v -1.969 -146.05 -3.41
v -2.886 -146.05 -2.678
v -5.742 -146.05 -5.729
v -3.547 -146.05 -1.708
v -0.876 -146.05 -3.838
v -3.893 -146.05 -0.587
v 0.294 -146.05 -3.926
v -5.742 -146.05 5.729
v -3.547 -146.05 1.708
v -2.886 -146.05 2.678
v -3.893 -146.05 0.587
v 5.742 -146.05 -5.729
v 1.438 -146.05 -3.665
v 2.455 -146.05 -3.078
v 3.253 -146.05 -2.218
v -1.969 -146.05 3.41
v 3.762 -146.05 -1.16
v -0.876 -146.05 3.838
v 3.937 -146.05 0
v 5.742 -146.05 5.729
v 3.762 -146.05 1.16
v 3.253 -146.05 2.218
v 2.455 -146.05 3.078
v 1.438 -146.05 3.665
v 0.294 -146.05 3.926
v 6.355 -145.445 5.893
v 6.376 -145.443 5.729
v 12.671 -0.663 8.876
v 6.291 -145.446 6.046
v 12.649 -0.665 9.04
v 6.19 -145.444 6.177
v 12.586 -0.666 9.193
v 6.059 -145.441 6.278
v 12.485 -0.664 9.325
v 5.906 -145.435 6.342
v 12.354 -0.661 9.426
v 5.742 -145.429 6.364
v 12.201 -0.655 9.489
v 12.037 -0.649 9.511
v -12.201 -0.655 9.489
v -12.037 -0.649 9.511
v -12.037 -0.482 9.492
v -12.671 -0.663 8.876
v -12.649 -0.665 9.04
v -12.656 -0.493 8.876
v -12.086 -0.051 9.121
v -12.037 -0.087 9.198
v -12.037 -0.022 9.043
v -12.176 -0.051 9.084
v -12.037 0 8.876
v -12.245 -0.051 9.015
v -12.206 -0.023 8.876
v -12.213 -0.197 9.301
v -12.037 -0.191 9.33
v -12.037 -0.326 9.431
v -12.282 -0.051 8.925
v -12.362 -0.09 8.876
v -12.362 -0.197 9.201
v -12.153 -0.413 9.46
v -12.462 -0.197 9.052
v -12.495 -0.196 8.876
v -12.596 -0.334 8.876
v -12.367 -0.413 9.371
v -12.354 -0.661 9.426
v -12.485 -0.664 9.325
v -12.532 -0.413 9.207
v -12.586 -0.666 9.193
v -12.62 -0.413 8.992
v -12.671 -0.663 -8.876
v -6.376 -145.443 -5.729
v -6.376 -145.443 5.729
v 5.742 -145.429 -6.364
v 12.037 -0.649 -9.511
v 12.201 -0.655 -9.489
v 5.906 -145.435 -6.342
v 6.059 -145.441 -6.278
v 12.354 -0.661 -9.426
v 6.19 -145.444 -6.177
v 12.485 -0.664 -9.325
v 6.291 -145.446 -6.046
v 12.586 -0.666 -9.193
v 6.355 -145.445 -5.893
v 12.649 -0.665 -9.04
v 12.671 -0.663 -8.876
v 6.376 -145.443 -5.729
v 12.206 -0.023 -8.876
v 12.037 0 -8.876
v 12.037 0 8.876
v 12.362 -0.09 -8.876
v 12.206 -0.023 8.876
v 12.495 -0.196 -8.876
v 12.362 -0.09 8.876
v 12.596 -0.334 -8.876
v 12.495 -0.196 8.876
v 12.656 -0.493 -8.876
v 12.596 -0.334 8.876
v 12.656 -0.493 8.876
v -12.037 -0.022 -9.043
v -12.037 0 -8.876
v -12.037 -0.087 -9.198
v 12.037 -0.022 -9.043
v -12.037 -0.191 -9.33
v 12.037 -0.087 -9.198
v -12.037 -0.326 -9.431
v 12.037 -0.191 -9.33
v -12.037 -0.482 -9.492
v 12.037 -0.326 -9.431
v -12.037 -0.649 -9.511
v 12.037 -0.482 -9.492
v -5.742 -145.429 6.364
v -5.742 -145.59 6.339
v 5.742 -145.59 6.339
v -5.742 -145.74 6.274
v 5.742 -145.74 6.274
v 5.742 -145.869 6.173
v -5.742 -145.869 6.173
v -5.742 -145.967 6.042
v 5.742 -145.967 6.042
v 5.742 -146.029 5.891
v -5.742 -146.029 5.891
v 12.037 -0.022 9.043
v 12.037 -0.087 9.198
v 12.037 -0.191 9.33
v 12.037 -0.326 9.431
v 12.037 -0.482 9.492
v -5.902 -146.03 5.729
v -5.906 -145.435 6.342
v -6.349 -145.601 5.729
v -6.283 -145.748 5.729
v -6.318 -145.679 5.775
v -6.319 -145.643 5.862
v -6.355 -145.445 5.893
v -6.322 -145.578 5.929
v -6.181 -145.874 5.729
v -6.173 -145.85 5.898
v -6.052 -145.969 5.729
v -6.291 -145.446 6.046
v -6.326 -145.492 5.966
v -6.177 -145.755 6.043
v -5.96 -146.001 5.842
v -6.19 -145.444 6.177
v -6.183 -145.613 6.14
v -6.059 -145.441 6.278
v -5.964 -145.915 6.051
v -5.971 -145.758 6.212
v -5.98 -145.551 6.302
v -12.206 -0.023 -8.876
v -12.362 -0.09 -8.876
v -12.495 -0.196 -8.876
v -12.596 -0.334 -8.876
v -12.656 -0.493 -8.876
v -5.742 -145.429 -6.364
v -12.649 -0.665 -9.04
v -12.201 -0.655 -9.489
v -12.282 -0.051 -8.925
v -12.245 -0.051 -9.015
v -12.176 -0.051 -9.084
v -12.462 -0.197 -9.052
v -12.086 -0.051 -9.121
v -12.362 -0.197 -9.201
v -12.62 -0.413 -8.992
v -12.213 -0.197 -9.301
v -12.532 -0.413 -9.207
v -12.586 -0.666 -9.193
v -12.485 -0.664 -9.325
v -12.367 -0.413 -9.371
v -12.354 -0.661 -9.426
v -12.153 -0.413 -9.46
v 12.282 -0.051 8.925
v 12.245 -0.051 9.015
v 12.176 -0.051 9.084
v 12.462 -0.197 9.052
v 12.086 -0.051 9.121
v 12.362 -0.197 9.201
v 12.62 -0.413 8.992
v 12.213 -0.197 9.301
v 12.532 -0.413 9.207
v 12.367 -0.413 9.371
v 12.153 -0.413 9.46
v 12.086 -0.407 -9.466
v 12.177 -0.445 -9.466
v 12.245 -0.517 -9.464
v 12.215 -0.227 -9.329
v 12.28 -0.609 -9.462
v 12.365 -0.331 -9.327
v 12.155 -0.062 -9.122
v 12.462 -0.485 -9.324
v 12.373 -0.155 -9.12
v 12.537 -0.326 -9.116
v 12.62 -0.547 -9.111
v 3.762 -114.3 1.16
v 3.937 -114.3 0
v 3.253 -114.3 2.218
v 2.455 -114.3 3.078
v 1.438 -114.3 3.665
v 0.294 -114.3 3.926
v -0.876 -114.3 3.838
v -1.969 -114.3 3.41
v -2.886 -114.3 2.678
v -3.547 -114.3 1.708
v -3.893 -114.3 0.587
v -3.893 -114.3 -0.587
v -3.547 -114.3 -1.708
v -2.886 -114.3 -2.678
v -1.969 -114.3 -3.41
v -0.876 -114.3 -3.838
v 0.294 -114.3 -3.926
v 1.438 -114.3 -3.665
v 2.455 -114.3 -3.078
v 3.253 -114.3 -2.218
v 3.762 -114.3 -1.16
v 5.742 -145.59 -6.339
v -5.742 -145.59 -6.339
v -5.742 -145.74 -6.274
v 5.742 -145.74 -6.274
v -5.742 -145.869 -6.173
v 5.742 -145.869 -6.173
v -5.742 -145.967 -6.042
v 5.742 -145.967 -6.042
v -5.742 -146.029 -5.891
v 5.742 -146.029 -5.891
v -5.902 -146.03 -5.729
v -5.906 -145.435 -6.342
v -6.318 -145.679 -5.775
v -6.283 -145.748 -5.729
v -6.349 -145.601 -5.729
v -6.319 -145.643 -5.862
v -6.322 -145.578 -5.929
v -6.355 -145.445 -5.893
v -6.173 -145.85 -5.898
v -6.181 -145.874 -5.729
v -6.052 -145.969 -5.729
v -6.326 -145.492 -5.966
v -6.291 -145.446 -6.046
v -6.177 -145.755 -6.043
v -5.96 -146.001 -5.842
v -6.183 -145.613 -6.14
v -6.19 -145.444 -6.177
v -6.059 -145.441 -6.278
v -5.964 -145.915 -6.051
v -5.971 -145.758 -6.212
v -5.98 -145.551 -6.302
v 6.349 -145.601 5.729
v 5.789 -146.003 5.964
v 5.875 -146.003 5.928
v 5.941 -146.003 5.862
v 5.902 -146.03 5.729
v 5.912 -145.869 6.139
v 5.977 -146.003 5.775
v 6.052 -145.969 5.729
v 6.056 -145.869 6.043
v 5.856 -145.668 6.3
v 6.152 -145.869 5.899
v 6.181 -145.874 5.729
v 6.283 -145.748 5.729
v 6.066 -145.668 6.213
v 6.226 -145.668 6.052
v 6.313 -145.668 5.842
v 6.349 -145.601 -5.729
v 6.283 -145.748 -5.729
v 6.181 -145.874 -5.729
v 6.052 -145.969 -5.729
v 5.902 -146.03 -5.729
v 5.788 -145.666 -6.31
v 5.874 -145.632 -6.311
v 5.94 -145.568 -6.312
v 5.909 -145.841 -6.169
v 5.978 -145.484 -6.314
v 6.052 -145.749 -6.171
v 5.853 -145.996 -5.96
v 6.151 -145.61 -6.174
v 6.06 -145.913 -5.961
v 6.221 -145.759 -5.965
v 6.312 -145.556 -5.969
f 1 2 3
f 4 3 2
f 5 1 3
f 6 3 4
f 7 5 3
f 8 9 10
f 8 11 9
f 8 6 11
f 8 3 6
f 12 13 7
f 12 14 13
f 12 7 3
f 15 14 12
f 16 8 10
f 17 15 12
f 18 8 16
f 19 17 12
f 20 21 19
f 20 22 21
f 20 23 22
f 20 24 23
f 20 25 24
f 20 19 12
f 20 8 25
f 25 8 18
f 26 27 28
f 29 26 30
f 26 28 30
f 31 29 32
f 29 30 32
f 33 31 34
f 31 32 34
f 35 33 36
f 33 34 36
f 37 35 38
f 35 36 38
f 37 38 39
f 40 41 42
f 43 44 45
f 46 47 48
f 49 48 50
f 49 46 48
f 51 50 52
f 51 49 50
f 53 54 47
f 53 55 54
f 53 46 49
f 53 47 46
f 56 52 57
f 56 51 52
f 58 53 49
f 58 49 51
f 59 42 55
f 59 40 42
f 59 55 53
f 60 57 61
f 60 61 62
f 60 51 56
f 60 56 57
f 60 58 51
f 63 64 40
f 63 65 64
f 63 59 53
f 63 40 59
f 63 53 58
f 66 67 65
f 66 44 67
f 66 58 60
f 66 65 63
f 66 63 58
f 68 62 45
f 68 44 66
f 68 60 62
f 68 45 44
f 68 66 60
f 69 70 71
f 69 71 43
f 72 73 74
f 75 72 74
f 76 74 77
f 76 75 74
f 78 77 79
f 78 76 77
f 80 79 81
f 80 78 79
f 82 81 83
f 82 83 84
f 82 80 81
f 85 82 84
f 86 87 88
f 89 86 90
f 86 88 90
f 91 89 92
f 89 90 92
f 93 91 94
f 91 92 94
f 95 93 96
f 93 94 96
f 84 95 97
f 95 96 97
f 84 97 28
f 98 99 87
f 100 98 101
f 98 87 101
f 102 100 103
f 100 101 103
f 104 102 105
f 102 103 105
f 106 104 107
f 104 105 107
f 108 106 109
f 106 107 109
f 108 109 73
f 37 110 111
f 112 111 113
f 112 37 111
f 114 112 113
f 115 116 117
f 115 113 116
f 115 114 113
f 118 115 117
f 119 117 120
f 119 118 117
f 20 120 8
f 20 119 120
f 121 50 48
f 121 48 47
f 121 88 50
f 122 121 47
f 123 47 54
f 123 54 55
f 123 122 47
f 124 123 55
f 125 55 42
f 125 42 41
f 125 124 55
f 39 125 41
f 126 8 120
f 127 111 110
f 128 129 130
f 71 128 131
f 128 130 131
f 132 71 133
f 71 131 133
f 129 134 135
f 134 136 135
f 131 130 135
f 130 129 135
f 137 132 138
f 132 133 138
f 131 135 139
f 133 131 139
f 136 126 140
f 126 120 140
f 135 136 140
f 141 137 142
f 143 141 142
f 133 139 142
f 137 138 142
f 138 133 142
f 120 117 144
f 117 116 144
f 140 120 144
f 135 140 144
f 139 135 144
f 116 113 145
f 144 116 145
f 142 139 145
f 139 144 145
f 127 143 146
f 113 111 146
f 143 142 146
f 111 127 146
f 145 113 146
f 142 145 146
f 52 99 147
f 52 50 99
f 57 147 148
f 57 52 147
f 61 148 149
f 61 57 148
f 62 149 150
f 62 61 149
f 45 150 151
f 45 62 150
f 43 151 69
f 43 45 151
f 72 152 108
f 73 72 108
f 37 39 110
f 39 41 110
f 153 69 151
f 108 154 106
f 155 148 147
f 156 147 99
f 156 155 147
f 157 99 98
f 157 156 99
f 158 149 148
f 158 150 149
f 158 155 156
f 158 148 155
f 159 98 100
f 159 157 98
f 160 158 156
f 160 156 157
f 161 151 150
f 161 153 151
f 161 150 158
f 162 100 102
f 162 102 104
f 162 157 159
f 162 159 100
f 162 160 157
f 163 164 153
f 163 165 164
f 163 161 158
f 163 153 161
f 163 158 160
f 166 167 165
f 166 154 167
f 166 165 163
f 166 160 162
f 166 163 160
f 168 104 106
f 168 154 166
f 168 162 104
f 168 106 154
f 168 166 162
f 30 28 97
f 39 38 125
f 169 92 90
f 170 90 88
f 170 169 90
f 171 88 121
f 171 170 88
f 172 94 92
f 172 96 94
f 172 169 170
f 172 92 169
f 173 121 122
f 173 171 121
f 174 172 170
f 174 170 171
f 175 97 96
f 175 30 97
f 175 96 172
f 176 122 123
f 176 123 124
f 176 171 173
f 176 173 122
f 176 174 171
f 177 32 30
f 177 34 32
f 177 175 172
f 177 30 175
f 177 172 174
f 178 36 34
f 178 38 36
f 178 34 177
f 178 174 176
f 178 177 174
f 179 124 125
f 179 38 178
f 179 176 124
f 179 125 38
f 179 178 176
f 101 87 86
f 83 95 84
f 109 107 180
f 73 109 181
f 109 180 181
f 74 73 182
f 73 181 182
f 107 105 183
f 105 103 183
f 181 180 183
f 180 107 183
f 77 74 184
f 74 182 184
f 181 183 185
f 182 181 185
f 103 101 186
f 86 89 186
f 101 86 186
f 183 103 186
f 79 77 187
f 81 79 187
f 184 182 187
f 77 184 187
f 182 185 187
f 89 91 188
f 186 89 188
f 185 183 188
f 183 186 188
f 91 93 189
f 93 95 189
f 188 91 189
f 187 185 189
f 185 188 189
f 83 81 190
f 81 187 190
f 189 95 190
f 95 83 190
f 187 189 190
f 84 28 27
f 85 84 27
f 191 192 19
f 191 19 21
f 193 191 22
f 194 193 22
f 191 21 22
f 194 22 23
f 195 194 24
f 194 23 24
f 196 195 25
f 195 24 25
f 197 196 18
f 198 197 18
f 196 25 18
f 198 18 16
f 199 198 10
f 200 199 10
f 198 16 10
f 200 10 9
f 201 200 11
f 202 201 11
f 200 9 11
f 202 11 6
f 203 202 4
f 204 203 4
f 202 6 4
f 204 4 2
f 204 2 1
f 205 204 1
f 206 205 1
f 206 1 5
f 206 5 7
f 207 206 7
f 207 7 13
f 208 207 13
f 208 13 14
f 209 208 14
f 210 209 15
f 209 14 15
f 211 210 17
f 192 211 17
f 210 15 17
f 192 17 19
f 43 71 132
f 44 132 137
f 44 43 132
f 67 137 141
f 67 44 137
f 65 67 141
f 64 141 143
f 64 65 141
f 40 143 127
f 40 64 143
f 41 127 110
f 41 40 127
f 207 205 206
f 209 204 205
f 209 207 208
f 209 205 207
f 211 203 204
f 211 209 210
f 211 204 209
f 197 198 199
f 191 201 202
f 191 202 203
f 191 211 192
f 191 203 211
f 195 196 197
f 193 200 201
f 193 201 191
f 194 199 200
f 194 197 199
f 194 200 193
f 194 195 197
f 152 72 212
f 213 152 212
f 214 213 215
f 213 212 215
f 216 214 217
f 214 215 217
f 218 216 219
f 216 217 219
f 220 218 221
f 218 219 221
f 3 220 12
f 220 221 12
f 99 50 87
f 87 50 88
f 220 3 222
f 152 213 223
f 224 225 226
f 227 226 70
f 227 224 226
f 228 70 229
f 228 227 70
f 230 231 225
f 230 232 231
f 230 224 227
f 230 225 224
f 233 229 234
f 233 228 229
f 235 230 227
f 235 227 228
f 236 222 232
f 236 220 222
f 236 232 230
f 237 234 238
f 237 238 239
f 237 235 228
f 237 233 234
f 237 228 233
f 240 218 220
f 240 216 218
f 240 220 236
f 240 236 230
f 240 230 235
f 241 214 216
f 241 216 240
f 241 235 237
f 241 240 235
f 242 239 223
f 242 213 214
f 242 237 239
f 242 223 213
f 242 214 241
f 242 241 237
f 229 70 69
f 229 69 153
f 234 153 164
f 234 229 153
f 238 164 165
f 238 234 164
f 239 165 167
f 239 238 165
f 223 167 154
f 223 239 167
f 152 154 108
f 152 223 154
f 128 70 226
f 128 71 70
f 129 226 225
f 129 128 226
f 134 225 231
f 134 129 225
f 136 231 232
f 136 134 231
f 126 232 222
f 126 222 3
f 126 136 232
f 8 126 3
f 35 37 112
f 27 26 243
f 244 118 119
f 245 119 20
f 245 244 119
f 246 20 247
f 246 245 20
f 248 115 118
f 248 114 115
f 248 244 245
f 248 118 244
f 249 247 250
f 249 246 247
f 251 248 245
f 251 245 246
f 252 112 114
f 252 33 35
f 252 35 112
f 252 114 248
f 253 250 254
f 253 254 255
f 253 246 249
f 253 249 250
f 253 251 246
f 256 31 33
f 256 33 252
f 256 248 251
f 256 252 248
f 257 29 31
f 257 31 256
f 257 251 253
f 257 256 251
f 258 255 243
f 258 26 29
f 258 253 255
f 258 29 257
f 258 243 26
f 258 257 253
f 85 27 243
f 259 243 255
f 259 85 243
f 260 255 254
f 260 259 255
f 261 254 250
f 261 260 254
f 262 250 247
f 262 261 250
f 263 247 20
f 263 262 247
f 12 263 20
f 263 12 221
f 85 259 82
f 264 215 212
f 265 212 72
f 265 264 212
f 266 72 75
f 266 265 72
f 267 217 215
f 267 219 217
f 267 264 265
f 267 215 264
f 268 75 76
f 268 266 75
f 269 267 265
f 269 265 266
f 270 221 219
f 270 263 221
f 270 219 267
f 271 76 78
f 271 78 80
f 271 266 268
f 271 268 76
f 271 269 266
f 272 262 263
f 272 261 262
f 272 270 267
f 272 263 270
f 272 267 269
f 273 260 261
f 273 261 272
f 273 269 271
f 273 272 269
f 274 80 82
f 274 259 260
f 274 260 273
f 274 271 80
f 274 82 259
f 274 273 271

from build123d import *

# Parameters (mm, degrees)
F0_W      = 25.4
F0_H      = 19.05
F1_DEPTH  = 146.05
F4_DEPTH  = 25.4
F6_DEPTH  = 25.4
F8_DEPTH  = 12.7
F9_R      = 0.635
F10_R     = 3.937
F11_DEPTH = 31.75


with BuildPart() as f1:
    # F0 (on Front) → F1 (new body)
    with BuildSketch(Plane.XZ):
        Rectangle(F0_W, F0_H)
    extrude(amount=F1_DEPTH)

    # F3 (on face) → F4 (cut)
    with BuildSketch(Plane(origin=(-12.7, 0, 0), x_dir=(0, -1, 0), z_dir=(-1, 0, 0))):
        Polygon((146.05, 9.525), (0, 9.525), (146.05, 6.35), align=None)
    extrude(amount=-F4_DEPTH, mode=Mode.SUBTRACT)

    # F5 (on face) → F6 (cut)
    with BuildSketch(Plane(origin=(-12.7, 0, 0), x_dir=(0, -1, 0), z_dir=(-1, 0, 0))):
        Polygon((146.05, -6.35), (0, -9.525), (146.05, -9.525), align=None)
    extrude(amount=-F6_DEPTH, mode=Mode.SUBTRACT)

    # F7 (on Top) → F8 (cut, symmetric)
    with BuildSketch(Plane.XY):
        Polygon((-12.7, -146.05), (-6.35, -146.05), (-12.7, 0), align=None)
        Polygon((6.35, -146.05), (12.7, -146.05), (12.7, 0), align=None)
    extrude(amount=F8_DEPTH, both=True, mode=Mode.SUBTRACT)

    # F9
    f9_edges = [f1.edges().sort_by_distance(p)[0] for p in [
        (9.525, -73.025, 7.9375),
        (0, -146.05, 6.35),
        (6.35, -146.05, 0),
        (0, -146.05, -6.35),
        (-6.35, -146.05, 0),
        (-9.525, -73.025, 7.9375),
        (-9.525, -73.025, -7.9375),
        (12.7, 0, 0),
        (0, 0, 9.525),
        (-12.7, 0, 0),
        (0, 0, -9.525),
        (9.525, -73.025, -7.9375),
    ]]
    fillet(f9_edges, radius=F9_R)

    # F10 (on face) → F11 (cut)
    with BuildSketch(Plane.XZ.offset(146.05)):
        Circle(F10_R)
    extrude(amount=-F11_DEPTH, mode=Mode.SUBTRACT)


solid = f1.part
